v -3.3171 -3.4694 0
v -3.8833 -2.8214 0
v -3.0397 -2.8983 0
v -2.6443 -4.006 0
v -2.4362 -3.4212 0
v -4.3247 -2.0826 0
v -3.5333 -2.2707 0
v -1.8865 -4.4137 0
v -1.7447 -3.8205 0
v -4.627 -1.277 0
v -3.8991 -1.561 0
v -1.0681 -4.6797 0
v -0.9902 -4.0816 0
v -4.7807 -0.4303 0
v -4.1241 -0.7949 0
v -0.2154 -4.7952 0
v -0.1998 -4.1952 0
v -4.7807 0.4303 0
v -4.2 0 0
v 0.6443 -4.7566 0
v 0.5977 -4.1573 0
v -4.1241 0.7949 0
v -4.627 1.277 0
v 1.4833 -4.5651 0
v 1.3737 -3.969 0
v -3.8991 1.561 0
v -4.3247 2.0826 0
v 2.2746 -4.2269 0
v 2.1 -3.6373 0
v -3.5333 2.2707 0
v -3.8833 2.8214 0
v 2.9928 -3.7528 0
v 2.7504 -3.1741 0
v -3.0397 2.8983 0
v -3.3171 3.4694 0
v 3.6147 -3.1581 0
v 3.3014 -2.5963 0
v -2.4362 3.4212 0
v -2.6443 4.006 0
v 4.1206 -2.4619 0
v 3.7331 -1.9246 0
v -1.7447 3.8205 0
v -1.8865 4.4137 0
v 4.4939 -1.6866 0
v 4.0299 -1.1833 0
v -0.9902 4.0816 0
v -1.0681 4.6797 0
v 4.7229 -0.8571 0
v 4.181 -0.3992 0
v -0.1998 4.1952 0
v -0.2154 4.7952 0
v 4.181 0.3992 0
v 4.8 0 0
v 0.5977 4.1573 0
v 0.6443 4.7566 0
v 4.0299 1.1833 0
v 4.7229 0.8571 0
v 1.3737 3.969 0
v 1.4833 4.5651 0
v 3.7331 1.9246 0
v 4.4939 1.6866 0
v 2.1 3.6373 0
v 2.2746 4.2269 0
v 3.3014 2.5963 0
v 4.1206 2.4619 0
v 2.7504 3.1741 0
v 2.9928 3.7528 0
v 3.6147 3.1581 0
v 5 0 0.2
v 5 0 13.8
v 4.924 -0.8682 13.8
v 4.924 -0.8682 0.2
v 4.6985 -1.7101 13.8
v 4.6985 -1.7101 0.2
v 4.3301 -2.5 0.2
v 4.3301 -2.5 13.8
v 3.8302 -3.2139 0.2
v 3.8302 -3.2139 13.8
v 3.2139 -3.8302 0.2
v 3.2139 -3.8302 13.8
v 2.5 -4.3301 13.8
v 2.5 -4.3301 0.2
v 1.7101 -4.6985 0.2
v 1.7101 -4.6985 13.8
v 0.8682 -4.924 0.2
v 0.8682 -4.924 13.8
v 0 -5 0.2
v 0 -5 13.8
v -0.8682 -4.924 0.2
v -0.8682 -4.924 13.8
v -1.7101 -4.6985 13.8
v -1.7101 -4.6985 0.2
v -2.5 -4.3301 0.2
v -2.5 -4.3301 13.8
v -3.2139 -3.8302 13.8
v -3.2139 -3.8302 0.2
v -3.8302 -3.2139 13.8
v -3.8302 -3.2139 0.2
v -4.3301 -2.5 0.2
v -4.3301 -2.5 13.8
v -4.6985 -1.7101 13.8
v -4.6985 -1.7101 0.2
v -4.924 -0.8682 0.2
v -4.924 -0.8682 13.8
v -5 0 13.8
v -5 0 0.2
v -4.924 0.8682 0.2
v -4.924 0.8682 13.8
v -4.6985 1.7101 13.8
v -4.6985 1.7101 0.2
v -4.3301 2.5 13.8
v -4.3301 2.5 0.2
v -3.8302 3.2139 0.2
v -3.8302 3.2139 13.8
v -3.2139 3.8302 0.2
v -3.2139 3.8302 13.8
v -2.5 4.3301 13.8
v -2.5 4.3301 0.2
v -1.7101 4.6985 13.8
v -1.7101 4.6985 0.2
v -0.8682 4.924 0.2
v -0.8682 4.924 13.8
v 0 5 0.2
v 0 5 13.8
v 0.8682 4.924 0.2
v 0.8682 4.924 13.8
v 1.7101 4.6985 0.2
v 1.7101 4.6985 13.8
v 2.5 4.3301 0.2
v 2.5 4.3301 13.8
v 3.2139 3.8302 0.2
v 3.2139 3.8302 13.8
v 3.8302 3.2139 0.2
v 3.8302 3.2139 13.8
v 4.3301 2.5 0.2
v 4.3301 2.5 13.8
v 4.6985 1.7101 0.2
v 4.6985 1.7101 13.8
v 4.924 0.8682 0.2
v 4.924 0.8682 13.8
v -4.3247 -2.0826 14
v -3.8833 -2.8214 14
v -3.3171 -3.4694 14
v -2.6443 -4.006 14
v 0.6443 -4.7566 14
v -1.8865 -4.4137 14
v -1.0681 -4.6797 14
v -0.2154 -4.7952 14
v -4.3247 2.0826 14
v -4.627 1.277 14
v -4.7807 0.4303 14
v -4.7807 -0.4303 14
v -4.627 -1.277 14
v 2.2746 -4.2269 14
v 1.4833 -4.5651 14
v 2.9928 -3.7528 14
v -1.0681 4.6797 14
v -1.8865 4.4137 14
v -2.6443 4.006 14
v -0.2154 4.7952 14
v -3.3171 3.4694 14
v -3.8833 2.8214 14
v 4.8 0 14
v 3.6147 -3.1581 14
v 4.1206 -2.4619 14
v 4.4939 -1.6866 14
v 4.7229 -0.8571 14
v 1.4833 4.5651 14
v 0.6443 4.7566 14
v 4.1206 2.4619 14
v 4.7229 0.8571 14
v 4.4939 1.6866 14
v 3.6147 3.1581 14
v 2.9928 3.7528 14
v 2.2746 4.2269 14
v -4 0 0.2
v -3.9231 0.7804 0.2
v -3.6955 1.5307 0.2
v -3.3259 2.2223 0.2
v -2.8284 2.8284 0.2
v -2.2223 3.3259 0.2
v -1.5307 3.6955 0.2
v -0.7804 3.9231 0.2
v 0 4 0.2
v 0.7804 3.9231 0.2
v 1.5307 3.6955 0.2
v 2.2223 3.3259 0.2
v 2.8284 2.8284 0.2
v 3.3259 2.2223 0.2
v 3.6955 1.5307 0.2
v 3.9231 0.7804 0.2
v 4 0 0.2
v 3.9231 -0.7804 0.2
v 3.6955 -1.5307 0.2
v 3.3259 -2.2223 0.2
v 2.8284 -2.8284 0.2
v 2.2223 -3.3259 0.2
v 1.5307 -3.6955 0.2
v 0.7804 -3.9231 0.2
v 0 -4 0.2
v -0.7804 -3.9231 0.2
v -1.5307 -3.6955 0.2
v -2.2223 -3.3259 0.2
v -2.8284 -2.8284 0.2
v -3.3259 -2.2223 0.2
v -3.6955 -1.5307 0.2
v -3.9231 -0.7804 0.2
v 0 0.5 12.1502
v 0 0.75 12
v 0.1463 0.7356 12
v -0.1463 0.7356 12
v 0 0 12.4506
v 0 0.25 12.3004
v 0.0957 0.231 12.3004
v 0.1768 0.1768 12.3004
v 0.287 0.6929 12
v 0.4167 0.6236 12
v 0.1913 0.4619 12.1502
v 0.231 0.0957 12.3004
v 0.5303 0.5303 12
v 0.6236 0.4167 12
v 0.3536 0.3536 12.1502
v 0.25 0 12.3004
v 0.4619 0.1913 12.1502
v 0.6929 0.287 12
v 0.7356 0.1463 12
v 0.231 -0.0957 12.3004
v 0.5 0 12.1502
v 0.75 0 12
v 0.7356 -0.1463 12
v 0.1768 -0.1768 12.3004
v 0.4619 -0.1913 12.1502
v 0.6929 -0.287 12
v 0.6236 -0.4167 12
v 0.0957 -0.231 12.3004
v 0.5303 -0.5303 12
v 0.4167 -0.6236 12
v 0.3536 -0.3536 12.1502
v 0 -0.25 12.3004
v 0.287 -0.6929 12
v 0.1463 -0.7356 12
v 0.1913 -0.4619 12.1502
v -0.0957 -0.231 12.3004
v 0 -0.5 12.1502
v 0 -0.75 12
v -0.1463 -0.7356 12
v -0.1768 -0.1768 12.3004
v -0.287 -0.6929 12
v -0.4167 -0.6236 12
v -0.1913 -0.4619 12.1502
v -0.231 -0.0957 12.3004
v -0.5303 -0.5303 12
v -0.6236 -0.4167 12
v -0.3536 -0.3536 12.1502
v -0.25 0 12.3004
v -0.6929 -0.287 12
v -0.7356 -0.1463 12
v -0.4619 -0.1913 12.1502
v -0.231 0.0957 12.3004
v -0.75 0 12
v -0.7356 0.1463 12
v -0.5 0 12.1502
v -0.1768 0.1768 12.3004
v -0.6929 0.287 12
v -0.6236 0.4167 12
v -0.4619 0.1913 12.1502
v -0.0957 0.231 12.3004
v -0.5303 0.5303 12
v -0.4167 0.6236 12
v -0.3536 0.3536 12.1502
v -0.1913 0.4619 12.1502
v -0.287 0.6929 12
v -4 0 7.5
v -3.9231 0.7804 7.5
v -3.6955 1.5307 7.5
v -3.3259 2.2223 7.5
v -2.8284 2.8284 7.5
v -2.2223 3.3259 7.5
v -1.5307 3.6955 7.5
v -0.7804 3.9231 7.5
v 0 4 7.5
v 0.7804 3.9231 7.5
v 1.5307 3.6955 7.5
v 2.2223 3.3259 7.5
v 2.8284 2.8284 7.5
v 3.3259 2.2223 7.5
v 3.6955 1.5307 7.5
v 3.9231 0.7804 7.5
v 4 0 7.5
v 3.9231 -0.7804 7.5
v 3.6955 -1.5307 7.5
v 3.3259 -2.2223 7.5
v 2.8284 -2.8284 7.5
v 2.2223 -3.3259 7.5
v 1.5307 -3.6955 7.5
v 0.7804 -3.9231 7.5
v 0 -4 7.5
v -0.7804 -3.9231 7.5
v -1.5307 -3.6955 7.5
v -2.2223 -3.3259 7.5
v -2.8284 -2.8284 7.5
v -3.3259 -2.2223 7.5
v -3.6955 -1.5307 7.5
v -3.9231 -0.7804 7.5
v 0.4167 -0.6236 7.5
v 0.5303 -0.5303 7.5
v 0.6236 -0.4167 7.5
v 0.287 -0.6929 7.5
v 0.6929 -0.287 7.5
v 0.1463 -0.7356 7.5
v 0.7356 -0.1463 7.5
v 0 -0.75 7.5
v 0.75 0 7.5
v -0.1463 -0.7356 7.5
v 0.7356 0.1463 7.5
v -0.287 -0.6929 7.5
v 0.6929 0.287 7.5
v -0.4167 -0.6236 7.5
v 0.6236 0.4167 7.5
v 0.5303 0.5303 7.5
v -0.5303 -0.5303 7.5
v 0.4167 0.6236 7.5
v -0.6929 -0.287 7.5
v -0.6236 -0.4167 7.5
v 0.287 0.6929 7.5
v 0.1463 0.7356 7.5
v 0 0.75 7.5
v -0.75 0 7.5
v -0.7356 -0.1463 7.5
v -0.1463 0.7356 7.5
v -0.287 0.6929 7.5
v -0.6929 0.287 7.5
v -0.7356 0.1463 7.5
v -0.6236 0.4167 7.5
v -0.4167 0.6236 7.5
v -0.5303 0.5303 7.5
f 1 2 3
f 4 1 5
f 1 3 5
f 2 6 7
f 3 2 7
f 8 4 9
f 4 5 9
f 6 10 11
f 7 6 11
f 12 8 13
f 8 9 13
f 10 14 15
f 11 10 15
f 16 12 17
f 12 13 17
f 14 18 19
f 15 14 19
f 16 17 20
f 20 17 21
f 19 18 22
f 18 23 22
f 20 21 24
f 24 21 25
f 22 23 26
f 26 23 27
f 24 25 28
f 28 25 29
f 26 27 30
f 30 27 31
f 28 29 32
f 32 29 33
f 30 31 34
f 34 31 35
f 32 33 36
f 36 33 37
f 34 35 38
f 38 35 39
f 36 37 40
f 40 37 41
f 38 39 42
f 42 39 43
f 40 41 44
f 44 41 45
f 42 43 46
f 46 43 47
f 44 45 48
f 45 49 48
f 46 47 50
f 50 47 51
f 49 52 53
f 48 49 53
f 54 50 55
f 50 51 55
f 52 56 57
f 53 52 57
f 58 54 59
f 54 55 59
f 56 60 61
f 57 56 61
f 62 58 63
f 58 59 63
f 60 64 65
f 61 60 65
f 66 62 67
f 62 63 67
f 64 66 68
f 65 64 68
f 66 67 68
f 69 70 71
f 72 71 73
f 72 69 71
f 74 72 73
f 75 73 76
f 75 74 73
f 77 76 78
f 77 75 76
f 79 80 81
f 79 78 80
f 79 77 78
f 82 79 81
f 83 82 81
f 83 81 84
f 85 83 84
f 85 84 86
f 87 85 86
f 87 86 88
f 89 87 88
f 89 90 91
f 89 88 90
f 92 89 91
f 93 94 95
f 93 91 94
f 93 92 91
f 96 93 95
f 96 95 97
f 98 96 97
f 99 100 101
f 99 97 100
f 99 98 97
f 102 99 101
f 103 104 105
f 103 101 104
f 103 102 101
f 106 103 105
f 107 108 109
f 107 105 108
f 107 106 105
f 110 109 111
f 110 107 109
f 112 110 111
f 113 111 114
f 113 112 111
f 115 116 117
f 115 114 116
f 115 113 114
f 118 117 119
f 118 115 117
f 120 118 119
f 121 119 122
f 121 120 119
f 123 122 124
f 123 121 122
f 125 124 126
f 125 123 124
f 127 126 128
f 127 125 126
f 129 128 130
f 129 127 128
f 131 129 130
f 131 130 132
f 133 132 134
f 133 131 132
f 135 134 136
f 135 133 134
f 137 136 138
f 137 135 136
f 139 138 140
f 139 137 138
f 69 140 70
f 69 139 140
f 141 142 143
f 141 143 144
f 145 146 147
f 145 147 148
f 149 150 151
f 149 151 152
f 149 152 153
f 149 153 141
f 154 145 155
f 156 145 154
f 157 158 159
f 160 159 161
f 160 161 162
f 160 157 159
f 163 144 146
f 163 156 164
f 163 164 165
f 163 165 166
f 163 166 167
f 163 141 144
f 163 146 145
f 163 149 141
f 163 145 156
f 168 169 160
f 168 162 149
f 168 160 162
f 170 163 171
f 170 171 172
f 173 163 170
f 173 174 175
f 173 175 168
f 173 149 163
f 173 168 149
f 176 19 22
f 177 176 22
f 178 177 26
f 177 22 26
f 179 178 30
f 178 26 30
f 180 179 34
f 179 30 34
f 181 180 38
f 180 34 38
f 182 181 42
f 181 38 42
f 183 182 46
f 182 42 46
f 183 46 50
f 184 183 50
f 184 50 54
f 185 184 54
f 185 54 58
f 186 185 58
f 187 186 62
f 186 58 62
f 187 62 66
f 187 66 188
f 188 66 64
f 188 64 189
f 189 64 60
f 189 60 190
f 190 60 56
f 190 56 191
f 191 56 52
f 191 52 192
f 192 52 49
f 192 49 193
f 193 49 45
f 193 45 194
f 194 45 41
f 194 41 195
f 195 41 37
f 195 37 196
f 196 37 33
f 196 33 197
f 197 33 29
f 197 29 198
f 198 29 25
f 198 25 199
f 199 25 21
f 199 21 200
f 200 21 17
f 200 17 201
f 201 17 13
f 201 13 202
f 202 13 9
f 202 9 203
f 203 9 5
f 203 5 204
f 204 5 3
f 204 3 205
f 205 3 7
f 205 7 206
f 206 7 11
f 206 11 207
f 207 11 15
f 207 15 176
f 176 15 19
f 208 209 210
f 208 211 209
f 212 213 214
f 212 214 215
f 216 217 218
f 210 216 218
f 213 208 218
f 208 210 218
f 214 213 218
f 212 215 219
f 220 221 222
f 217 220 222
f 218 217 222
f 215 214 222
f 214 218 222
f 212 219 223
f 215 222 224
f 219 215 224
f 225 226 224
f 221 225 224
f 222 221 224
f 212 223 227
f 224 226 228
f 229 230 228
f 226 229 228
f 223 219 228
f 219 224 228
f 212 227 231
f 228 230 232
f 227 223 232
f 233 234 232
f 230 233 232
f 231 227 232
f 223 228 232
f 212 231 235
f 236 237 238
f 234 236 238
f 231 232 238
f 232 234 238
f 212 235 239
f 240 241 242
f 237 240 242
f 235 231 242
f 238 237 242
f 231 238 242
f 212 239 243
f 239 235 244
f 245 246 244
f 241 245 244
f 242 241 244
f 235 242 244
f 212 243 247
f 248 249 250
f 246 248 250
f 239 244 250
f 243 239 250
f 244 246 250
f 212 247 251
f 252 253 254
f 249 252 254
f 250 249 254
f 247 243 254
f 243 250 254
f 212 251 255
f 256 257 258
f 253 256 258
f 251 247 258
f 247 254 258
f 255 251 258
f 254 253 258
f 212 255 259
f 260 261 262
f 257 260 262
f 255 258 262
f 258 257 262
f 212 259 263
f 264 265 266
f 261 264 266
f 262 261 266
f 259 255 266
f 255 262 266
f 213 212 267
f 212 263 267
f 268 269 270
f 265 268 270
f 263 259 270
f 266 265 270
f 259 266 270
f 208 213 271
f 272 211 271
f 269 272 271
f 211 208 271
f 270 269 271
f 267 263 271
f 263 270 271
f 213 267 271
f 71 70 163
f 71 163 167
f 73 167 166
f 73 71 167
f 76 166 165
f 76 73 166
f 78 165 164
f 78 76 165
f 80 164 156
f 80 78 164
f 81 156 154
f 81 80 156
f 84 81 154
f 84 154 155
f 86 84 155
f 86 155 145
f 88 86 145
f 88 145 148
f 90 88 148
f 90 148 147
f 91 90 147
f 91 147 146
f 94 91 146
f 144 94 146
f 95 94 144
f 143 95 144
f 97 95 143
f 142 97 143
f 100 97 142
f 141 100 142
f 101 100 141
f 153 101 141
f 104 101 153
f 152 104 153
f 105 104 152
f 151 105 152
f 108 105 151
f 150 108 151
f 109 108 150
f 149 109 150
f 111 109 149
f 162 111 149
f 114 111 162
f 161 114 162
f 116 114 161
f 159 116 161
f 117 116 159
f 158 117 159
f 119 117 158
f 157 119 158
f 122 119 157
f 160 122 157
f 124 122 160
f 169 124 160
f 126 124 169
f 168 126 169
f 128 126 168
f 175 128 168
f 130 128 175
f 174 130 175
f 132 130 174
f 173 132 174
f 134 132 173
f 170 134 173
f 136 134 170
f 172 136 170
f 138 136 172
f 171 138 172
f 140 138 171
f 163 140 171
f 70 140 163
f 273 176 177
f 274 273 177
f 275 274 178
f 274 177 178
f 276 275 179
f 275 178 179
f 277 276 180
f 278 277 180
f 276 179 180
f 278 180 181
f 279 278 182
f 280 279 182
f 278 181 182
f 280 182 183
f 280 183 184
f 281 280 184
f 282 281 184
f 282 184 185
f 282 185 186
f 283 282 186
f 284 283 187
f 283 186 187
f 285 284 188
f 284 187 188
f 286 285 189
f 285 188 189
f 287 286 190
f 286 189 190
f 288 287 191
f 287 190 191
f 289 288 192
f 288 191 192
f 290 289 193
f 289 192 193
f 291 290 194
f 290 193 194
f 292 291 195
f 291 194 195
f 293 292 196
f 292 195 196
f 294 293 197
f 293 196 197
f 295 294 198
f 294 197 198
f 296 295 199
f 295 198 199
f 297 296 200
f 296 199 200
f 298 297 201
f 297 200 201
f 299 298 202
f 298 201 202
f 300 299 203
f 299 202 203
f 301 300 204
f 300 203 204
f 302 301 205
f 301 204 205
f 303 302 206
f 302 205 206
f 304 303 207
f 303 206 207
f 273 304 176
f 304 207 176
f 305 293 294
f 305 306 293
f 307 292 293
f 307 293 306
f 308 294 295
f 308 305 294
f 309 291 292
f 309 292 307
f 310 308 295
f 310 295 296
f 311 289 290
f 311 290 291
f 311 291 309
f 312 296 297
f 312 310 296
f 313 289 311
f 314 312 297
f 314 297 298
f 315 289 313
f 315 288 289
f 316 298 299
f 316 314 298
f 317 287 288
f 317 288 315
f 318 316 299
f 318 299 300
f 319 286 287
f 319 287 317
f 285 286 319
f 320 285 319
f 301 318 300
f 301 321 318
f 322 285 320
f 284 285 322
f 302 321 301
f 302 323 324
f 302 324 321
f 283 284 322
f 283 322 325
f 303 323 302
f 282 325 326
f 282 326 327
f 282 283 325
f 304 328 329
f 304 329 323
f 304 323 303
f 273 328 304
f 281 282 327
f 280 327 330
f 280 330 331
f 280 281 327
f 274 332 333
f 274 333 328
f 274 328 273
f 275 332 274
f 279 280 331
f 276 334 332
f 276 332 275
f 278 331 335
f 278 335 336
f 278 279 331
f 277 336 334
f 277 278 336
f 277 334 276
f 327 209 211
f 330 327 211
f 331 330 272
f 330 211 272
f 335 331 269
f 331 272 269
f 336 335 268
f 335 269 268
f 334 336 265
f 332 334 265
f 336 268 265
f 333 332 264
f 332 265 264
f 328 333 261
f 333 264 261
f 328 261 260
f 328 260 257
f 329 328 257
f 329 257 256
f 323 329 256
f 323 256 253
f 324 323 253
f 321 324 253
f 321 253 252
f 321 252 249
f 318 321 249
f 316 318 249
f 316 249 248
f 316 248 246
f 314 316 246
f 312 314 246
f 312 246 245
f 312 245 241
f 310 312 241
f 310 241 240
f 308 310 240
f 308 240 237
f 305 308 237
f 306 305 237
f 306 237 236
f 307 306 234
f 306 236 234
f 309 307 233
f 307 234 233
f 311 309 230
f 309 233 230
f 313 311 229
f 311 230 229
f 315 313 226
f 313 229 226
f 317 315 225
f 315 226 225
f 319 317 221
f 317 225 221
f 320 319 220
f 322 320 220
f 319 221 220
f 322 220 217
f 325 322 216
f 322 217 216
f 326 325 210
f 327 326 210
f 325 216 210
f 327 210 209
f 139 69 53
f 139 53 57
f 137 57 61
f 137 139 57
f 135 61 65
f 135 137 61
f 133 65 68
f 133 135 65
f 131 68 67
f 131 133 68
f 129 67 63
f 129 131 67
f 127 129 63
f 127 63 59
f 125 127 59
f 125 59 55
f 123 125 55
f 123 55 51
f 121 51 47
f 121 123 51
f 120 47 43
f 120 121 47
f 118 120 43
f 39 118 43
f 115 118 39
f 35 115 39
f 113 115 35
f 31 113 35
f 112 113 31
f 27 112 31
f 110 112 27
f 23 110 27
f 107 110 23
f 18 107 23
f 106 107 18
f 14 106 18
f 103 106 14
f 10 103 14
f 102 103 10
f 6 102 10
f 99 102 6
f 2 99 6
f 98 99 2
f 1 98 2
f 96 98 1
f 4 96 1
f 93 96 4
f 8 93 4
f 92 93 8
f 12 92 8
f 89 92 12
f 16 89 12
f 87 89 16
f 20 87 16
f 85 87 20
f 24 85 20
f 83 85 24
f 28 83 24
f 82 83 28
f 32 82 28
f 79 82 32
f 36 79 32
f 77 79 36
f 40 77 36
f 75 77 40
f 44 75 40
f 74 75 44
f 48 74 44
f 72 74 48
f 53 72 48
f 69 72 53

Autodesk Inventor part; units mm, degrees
ref_plane "YZ Plane" through (0, 0, 0) normal (1, 0, 0) x (0, 1, 0)
ref_plane "XZ Plane" through (0, 0, 0) normal (0, 1, 0) x (-1, 0, 0)
sketch "Skizze1" plane through (0, 0, 0) normal (0, 0, 1) x (1, 0, 0)
  circle A0 centre (0, 0) radius 5
  dimension "d0" = 10
extrude "Extrusion1" add sketch "Skizze1" along normal blind 14
sketch "Skizze2" plane through (0, 0, 0) normal (0, 0, -1) x (-1, 0, 0)
  circle A0 centre (0, 0) radius 4
  dimension "d3" = 8
extrude "Extrusion2" cut sketch "Skizze2" against normal blind 7.5
ref_plane "Arbeitsebene1" through (0, 0, 7.5) normal (0, 0, 1) x (1, 0, 0)
sketch "Skizze3" plane through (0, 0, 7.5) normal (0, 0, 1) x (1, 0, 0)
  point P0 (0, 0)
  point P1 (0, 0)
hole "Bohrung1" at (0, 0, 7.5) direction (0, 0, 1) diameter 1.5 depth 4.5 tip angle 118
chamfer "Fasen1" distance 0.2 angle 45 3 edges at (4, 0, 0) (-5, 0, 0) (-5, 0, 14)
properties part number "Arbeitskolben" material "Bronze, Guss"
